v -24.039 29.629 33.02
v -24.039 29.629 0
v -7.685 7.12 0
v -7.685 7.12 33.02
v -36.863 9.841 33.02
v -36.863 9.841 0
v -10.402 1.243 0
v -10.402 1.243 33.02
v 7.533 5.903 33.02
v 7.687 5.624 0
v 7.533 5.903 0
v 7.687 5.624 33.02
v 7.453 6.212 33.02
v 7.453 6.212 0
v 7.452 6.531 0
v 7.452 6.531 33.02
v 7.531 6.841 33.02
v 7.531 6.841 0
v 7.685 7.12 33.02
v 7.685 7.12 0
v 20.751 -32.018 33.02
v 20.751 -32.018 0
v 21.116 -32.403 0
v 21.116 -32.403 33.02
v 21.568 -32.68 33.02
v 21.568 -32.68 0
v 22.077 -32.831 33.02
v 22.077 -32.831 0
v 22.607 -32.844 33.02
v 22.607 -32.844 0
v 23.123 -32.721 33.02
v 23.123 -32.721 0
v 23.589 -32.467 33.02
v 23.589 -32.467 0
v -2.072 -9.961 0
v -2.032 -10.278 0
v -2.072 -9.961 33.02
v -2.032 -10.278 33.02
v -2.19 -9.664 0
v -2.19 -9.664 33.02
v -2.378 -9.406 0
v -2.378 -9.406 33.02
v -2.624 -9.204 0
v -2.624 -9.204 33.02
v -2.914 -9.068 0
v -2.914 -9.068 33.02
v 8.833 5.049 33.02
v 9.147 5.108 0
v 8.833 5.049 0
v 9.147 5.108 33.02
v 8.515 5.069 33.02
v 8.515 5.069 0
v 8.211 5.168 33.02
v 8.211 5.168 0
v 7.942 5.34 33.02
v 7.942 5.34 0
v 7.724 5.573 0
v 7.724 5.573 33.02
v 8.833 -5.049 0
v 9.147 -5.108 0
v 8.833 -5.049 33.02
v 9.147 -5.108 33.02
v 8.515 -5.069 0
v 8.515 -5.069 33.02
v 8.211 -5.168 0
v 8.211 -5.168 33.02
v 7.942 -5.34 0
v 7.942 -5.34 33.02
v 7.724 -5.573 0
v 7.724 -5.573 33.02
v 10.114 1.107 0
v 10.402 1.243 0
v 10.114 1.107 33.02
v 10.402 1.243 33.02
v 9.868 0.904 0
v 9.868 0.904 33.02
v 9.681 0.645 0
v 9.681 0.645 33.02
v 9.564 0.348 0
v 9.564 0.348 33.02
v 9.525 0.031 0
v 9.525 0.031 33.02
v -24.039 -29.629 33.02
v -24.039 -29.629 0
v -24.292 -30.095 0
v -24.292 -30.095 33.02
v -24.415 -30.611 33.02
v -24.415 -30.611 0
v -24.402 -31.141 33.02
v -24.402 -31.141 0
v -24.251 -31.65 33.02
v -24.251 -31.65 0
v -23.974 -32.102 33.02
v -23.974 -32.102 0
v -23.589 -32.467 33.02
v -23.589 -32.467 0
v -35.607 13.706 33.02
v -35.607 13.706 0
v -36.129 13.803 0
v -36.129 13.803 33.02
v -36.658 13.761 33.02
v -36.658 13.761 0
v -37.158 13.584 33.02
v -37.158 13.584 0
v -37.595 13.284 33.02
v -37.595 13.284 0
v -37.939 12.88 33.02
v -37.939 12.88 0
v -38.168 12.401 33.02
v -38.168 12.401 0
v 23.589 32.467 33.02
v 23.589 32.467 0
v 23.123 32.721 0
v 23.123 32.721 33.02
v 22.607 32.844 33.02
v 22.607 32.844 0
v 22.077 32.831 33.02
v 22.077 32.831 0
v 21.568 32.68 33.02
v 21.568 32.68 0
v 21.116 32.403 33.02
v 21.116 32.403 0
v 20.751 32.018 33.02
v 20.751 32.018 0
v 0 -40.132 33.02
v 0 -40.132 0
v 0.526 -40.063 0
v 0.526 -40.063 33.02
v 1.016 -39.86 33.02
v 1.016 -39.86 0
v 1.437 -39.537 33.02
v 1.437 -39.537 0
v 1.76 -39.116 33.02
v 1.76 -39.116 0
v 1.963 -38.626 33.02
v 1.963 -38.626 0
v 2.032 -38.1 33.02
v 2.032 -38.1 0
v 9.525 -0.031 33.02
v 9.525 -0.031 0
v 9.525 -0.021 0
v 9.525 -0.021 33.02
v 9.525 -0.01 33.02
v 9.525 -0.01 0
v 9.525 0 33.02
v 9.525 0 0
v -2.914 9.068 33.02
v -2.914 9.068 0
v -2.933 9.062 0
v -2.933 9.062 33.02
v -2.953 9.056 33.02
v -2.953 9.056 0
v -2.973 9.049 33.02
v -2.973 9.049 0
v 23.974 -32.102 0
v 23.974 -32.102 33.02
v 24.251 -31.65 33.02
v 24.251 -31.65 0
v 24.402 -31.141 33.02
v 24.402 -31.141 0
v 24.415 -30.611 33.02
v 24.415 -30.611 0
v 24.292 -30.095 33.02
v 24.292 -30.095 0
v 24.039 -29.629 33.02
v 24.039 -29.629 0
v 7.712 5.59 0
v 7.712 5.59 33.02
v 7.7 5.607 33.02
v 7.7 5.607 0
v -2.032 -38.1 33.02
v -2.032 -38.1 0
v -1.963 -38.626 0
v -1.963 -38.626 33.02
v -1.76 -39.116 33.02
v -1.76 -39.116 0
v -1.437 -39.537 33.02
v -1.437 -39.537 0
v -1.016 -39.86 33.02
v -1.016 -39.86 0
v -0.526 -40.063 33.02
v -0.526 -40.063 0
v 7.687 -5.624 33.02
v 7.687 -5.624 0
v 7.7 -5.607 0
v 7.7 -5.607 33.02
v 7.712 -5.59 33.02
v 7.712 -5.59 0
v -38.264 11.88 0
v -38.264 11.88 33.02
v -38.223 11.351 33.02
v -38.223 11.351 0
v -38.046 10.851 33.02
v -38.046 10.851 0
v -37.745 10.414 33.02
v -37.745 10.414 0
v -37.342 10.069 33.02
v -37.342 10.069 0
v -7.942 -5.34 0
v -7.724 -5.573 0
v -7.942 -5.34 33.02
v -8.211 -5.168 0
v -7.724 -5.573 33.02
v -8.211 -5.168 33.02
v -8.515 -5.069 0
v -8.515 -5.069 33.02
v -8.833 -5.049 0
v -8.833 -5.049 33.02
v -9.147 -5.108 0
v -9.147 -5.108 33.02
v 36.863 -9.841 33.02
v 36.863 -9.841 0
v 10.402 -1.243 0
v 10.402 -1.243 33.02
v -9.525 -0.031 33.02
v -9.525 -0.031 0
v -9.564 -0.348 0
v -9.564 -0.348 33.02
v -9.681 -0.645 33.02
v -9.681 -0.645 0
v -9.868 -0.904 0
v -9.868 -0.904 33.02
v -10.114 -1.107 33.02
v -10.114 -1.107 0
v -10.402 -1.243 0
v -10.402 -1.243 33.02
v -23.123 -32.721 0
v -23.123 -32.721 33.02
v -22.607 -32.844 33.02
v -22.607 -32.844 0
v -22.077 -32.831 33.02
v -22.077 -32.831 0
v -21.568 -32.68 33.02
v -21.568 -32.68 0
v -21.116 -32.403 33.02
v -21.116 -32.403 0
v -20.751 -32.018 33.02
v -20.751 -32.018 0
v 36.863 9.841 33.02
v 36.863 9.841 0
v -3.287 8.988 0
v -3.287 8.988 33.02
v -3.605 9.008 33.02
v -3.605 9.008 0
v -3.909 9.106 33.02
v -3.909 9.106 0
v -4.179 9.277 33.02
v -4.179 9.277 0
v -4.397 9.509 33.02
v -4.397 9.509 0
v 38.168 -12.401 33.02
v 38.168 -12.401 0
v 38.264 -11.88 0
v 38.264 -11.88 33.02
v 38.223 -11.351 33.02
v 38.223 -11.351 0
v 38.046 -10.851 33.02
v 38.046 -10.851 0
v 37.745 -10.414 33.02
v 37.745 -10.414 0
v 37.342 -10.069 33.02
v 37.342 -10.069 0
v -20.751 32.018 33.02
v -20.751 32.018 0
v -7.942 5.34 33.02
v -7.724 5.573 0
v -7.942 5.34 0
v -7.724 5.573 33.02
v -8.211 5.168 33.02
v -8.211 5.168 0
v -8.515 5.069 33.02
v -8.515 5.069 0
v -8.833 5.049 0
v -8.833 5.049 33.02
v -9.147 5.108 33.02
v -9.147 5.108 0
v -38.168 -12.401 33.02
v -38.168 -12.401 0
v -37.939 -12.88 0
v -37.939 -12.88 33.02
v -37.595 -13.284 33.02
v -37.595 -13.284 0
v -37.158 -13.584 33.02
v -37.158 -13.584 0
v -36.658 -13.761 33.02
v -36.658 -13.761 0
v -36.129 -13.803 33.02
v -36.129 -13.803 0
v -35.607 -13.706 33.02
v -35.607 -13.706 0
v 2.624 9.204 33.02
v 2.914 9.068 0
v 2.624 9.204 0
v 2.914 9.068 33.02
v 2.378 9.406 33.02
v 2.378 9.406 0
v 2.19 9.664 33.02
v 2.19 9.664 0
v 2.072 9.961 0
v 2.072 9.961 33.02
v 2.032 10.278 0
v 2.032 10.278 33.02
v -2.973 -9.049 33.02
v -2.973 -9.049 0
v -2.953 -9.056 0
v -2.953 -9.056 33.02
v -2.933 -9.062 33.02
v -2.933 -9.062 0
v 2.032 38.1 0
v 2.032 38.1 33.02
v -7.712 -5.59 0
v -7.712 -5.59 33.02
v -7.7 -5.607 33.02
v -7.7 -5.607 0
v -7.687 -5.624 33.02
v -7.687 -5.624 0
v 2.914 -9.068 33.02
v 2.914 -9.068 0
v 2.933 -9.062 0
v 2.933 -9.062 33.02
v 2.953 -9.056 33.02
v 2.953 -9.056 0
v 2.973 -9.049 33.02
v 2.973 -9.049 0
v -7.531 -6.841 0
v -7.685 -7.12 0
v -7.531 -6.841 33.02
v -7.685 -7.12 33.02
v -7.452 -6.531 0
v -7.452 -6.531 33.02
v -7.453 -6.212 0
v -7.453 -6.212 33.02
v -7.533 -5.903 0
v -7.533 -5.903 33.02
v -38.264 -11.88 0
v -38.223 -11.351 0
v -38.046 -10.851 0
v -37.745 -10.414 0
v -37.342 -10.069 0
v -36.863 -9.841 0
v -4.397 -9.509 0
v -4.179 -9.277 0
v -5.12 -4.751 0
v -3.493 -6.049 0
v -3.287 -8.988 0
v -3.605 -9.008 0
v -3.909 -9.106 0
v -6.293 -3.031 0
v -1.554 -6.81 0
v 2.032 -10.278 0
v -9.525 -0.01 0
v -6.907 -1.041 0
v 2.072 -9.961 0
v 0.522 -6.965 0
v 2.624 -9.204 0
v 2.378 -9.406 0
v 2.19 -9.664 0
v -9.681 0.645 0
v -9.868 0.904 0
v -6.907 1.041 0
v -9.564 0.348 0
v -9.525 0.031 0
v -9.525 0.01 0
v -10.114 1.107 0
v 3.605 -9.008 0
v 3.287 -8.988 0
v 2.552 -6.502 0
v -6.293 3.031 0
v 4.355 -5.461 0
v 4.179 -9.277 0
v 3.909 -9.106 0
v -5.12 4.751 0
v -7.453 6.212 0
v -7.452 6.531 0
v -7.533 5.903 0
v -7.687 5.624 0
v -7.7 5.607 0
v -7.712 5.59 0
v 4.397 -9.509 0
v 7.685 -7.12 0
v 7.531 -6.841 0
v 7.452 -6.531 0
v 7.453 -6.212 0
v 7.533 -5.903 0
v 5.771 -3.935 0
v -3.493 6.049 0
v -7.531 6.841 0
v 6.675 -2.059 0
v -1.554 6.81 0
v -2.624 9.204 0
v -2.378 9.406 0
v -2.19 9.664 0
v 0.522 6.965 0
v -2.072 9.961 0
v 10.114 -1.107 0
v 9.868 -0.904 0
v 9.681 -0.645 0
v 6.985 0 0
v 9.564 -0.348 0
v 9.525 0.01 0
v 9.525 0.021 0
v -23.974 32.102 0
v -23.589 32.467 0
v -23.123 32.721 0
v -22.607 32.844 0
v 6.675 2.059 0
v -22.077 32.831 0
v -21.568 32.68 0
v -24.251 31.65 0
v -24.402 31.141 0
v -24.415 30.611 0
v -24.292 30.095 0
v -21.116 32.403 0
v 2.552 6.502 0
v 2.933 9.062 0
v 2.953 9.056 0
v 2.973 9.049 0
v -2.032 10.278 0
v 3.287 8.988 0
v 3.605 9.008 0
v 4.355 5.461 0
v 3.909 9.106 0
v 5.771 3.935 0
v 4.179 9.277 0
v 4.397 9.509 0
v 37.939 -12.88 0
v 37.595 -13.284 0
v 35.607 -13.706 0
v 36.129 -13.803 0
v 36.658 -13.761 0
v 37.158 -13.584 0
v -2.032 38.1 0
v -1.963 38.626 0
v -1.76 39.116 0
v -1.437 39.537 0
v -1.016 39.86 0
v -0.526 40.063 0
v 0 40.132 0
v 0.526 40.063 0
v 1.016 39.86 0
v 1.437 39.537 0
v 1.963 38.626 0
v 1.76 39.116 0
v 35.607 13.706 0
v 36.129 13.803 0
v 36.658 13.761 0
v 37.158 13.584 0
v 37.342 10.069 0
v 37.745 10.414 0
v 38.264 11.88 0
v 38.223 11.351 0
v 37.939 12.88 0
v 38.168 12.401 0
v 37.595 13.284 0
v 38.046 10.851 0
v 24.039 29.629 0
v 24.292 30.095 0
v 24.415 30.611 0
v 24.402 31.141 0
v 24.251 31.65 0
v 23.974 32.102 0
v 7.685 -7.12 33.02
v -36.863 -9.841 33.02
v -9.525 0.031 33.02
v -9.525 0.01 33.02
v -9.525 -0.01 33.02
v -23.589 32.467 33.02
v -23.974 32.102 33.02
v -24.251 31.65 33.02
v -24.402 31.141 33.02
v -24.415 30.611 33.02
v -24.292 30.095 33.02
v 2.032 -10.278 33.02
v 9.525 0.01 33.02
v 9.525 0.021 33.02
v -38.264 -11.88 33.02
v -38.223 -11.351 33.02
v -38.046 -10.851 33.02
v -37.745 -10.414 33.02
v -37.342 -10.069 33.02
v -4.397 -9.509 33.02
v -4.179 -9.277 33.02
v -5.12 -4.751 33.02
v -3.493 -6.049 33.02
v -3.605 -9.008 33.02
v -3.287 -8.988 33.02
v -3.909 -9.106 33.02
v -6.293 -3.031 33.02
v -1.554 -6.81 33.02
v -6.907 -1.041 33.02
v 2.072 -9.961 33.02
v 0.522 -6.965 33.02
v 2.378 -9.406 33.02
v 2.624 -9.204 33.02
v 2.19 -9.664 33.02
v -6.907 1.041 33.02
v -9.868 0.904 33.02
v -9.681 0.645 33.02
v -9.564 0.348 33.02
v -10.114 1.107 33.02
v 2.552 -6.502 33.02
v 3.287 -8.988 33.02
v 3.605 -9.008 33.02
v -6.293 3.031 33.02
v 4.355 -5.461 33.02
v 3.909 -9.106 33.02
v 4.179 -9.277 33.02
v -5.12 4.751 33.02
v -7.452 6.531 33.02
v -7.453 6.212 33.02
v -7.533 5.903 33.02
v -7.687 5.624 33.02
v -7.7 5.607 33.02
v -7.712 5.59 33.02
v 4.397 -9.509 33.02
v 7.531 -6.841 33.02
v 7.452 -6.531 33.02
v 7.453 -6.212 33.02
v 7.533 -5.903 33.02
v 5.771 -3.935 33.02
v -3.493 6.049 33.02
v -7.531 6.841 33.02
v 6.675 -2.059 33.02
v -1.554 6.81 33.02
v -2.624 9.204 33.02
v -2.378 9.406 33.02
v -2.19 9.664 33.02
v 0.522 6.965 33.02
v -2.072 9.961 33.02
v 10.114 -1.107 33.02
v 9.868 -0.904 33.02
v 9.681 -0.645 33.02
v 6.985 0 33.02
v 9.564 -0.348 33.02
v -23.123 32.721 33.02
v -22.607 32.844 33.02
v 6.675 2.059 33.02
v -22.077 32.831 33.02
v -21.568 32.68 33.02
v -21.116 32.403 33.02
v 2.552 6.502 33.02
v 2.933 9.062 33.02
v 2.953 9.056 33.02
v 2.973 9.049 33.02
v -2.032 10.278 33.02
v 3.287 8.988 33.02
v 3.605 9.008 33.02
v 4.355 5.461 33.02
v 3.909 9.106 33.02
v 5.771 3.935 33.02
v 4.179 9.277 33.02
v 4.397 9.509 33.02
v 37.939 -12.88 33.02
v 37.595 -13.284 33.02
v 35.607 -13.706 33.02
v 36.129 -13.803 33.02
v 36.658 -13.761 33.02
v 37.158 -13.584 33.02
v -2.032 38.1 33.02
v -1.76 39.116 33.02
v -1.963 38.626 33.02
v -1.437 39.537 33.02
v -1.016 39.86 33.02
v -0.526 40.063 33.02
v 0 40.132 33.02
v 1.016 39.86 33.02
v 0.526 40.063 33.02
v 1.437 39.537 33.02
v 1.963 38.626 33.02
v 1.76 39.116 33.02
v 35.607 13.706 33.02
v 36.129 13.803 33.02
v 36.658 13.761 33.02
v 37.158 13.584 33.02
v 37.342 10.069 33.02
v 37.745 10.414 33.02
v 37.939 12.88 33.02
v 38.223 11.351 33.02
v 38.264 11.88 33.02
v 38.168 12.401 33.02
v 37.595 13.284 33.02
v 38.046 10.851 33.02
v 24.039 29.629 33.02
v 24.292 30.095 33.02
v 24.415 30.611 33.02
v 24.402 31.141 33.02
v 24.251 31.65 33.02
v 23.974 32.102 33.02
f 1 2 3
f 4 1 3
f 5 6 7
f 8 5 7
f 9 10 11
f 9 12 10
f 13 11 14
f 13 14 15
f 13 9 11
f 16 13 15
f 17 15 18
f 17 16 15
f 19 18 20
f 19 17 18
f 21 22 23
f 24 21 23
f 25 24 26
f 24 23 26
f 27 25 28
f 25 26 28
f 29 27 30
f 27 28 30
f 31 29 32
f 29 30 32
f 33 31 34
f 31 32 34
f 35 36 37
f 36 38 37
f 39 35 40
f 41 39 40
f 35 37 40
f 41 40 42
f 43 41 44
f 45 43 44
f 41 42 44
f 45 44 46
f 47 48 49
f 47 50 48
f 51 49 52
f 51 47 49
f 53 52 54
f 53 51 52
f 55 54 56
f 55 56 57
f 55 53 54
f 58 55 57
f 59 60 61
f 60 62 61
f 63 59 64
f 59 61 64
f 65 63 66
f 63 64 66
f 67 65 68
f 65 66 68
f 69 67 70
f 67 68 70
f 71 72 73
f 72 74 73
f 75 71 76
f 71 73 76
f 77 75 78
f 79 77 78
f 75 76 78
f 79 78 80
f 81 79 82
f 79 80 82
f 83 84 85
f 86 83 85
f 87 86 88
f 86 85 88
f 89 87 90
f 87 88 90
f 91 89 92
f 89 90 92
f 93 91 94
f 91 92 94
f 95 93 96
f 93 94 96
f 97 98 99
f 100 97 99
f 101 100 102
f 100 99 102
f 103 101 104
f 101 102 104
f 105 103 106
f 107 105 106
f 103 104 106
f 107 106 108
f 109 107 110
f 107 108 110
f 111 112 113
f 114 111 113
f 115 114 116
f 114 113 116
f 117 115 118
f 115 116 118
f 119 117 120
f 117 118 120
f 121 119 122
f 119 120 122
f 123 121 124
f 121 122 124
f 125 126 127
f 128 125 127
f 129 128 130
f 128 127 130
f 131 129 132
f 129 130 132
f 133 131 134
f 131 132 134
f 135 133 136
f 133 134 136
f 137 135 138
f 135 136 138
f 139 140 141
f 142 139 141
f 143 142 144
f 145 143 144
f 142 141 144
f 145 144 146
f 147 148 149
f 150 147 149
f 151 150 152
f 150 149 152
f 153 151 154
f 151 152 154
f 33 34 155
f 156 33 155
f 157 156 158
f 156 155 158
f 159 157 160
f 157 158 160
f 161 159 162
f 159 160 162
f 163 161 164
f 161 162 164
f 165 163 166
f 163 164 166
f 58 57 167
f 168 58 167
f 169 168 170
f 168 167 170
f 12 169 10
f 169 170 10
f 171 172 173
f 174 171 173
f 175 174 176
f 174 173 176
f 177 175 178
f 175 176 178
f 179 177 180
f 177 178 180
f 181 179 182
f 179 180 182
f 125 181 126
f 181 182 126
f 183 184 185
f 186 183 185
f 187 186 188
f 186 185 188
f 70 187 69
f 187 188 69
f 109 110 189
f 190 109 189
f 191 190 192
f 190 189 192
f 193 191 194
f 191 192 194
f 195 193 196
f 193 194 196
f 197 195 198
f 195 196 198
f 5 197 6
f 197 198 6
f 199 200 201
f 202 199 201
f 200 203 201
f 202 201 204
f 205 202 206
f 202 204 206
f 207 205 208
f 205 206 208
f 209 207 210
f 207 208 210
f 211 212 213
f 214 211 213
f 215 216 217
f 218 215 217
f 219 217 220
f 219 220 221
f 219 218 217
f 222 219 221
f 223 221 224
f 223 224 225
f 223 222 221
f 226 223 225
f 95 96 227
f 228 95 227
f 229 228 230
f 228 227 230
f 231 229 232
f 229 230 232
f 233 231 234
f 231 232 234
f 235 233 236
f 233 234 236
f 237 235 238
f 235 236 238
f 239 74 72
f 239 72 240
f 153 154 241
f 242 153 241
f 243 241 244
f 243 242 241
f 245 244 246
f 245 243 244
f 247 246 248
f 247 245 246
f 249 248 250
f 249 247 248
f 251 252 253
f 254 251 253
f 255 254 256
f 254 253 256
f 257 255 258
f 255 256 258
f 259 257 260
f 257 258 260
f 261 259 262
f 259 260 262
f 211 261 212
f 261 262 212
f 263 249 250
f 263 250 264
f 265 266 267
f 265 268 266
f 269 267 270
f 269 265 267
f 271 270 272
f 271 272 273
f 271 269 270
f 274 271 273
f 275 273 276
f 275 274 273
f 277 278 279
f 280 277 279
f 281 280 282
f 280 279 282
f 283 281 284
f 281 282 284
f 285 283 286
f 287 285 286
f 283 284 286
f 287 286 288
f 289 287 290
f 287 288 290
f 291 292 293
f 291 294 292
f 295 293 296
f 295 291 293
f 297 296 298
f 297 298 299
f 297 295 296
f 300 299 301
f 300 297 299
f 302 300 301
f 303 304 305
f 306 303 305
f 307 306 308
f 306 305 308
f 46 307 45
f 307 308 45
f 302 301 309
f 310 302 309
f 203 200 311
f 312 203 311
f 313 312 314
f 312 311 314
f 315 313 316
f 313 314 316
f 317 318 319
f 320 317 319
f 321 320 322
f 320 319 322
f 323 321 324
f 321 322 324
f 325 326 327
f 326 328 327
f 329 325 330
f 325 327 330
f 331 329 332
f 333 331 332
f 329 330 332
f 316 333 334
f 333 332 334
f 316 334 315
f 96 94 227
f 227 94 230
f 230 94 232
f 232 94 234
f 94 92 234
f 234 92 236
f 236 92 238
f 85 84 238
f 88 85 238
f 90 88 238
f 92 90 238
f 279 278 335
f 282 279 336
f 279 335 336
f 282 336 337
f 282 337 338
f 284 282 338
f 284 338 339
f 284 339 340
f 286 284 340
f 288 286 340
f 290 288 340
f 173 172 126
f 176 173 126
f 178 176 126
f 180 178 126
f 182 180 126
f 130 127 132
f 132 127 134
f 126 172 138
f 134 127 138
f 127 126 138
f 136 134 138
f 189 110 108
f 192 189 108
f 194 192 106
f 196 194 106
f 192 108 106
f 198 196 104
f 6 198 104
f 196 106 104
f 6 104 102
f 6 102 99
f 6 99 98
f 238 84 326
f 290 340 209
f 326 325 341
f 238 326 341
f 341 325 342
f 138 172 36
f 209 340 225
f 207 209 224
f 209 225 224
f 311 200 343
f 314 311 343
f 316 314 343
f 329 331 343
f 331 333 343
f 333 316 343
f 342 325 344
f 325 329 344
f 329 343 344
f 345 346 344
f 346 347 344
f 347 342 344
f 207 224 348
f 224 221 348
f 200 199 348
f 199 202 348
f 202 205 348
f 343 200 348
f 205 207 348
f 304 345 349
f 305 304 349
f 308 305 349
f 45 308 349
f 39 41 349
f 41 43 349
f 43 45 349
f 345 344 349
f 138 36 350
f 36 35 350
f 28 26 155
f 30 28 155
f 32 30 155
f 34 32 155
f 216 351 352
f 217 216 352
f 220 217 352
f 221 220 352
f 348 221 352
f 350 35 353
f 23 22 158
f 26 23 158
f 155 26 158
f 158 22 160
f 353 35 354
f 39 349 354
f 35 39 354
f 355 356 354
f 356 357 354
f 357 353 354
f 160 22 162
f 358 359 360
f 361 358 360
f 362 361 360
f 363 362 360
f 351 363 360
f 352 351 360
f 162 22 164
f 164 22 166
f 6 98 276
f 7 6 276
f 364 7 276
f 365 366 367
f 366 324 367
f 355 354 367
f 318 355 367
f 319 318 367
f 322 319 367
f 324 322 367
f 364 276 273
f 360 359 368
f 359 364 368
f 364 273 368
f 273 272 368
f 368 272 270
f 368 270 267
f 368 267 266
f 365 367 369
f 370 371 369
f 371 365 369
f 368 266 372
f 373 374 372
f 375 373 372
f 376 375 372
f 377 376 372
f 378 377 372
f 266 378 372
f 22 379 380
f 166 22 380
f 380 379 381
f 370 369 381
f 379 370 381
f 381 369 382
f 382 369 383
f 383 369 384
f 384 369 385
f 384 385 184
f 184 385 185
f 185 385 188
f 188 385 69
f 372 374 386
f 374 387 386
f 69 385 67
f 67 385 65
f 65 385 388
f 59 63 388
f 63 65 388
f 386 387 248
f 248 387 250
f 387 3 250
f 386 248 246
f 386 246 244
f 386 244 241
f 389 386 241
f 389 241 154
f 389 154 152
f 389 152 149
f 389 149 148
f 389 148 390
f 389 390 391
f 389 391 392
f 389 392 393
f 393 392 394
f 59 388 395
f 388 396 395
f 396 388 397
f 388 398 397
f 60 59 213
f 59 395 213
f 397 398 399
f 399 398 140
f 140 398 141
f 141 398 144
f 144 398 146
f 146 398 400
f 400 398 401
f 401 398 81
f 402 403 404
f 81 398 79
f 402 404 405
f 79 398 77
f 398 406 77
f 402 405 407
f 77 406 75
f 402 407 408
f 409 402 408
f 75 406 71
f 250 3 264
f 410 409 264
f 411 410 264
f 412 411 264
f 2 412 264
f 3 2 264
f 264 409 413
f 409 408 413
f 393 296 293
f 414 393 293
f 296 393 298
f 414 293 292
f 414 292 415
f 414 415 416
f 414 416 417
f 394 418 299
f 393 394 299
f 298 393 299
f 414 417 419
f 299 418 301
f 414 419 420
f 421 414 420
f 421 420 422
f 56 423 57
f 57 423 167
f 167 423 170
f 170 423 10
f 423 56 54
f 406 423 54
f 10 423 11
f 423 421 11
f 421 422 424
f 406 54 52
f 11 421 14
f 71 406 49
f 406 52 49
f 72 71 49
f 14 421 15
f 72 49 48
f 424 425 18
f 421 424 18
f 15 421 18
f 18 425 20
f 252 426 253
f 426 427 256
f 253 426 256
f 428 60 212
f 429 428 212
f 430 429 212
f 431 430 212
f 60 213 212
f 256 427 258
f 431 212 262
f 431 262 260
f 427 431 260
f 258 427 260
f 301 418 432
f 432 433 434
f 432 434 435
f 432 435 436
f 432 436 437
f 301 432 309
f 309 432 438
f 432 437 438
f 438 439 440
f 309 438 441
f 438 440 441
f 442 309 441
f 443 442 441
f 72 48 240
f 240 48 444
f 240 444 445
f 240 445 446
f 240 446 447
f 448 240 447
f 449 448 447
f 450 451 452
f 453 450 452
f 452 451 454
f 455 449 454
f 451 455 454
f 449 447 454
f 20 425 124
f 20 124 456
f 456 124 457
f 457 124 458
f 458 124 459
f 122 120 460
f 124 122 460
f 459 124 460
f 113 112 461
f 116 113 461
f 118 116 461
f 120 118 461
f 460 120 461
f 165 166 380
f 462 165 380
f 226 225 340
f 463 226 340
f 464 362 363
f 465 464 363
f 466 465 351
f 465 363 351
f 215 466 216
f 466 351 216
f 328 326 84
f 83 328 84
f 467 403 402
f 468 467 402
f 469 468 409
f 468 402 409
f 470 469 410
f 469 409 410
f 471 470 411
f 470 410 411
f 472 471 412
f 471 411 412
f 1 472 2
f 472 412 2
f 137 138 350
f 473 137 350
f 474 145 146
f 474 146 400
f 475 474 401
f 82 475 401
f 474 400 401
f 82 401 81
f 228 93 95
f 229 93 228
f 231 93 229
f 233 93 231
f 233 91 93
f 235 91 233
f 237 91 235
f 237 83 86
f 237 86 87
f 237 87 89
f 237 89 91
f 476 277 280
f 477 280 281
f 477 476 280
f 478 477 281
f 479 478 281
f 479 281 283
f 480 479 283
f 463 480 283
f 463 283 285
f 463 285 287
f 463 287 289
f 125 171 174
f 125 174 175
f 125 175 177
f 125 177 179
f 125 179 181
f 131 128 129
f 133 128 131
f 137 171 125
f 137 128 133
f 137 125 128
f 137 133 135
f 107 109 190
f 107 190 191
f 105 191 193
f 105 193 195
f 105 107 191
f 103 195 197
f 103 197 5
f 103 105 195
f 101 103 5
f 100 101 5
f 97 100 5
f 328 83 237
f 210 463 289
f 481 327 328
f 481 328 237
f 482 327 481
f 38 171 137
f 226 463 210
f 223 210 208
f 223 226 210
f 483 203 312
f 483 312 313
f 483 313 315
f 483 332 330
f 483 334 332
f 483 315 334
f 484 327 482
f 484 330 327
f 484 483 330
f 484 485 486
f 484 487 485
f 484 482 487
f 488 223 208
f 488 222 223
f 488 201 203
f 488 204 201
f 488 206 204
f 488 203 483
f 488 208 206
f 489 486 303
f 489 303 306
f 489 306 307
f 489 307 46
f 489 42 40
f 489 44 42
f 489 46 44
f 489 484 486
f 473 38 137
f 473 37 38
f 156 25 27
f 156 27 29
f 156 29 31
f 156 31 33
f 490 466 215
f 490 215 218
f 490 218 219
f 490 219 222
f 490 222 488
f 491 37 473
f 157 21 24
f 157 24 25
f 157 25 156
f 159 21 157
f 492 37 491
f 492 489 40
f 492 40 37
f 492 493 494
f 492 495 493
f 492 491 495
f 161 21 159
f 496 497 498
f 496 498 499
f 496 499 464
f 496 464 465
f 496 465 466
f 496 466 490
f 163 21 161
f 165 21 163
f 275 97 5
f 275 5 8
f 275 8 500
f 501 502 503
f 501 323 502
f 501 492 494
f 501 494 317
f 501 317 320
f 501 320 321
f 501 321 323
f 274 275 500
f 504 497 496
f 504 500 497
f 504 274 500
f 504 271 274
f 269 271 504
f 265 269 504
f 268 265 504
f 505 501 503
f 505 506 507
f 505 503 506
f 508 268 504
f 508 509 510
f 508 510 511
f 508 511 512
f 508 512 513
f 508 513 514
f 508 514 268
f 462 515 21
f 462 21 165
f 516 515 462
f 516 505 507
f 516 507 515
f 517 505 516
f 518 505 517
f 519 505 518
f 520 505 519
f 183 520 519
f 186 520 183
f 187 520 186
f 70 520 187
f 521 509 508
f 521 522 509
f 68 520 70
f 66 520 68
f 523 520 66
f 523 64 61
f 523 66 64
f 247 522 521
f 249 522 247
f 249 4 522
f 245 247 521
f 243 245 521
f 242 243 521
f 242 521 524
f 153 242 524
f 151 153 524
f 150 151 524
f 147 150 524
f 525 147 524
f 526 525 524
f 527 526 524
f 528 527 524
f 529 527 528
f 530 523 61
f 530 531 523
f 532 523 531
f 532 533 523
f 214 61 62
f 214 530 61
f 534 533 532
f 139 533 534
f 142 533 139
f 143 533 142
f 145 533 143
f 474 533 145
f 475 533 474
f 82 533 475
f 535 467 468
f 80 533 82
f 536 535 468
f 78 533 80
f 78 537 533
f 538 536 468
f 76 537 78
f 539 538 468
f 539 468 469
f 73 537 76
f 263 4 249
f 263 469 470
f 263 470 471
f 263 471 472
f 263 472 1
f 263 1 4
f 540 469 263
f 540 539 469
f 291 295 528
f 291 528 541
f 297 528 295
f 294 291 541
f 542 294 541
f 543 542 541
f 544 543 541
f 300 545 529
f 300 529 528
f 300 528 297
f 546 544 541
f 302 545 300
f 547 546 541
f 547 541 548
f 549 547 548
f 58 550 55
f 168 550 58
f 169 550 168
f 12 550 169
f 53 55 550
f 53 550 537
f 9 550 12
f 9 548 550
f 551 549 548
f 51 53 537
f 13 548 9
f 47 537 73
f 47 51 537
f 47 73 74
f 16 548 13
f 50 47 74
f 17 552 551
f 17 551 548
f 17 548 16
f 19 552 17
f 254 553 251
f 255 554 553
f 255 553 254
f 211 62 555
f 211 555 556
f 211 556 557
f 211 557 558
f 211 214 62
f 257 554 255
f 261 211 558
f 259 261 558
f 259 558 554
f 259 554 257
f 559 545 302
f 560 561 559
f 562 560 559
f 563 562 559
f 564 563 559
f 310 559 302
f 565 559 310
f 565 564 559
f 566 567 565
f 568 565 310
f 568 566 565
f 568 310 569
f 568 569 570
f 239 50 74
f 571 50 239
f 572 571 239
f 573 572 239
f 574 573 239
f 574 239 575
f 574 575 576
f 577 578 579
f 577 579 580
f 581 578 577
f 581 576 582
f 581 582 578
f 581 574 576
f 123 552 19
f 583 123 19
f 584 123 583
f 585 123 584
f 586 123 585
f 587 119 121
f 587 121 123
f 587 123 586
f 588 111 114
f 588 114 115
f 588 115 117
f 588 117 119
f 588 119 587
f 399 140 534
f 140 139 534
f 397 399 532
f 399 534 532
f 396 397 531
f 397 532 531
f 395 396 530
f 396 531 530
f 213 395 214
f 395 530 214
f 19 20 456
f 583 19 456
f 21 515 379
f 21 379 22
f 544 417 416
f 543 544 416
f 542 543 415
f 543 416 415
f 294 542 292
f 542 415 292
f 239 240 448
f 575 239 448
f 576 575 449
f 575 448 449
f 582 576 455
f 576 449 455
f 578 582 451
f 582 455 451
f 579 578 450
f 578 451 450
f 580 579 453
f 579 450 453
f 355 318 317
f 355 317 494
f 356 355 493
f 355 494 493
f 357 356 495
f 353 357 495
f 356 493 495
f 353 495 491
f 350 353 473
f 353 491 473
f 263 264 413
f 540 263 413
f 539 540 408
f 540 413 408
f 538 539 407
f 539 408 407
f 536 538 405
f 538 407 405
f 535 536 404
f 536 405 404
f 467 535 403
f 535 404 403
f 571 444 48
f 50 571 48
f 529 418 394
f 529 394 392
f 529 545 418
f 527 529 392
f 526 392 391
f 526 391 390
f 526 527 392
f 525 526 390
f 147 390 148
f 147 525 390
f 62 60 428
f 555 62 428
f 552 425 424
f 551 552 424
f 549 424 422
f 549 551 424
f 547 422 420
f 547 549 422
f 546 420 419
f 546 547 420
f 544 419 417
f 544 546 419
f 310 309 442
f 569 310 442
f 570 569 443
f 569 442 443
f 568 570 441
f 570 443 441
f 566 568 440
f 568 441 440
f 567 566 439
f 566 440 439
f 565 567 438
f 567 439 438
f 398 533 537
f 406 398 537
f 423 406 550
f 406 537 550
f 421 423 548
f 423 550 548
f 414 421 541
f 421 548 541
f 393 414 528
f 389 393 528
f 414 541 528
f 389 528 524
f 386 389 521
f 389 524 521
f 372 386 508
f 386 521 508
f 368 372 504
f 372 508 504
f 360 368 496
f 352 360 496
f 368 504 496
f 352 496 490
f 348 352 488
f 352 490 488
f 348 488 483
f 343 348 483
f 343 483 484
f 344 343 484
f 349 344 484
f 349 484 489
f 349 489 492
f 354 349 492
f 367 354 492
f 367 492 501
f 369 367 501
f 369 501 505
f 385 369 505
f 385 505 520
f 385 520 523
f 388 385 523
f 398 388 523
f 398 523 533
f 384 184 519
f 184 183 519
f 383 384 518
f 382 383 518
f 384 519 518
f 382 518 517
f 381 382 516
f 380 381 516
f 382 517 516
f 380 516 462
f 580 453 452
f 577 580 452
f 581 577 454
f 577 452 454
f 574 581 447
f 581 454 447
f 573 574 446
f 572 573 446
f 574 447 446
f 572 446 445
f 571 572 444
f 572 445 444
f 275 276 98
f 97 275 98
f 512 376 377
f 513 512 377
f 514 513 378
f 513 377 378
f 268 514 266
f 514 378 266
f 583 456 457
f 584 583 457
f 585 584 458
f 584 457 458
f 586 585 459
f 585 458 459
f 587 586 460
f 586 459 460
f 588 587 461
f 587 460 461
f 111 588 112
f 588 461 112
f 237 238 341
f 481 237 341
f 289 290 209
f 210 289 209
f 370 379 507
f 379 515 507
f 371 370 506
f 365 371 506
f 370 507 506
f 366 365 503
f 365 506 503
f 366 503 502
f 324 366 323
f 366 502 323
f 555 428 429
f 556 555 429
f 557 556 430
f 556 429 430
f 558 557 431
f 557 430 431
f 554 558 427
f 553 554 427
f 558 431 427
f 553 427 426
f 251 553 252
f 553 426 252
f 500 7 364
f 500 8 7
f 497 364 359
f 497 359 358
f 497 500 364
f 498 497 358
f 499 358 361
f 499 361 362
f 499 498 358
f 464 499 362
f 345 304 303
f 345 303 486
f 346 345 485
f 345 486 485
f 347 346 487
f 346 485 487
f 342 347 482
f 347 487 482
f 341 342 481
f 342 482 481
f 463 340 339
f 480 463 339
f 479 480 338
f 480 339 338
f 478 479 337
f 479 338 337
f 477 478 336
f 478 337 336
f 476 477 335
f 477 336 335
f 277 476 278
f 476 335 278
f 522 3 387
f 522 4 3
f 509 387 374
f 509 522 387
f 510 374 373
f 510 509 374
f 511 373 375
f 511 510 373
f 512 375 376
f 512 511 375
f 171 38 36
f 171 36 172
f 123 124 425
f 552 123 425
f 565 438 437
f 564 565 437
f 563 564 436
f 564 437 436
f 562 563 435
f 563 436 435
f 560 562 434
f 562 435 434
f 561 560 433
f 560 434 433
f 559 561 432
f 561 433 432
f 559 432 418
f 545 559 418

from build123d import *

# Parameters (mm, degrees)
F1_DEPTH = 33.02
F2_R     = 6.985
F3_DEPTH = 33.021
F4_R     = 1.27


with BuildPart() as f1:
    # F0 (on Top) → F1 (new body)
    with BuildSketch(Plane.XY):
        with BuildLine():
            Line((-2.032, 6.2538529475), (0, 3.4570448851))
            Line((0, 3.4570448851), (0, 9.525))
            ThreePointArc((0, 9.525), (-1.0218981804, 9.4700237122), (-2.032, 9.3057294717))
            Line((-2.032, 9.3057294717), (-2.032, 6.2538529475))
        make_face()
        with BuildLine():
            Line((0, 9.525), (0, 3.4570448851))
            Line((0, 3.4570448851), (2.032, 6.2538529475))
            Line((2.032, 6.2538529475), (2.032, 9.3057294717))
            ThreePointArc((2.032, 9.3057294717), (1.0218981804, 9.4700237122), (0, 9.525))
        make_face()
        with BuildLine():
            Line((-5.5986545281, 7.7058868714), (-2.032, 2.7968080624))
            Line((-2.032, 2.7968080624), (-2.032, 6.2538529475))
            Line((-2.032, 6.2538529475), (-3.8258480127, 8.7228729203))
            ThreePointArc((-3.8258480127, 8.7228729203), (-4.7396072824, 8.2620668001), (-5.5986545281, 7.7058868714))
        make_face()
        with BuildLine():
            Line((-5.3198450651, 3.8650936822), (-2.032, 2.7968080624))
            Line((-2.032, 2.7968080624), (-5.5986545281, 7.7058868714))
            ThreePointArc((-5.5986545281, 7.7058868714), (-6.3930732713, 7.0607534405), (-7.1136930778, 6.334113655))
            Line((-7.1136930778, 6.334113655), (-5.3198450651, 3.8650936822))
        make_face()
        with BuildLine():
            Line((-9.0588133177, 2.9433868714), (-3.2878450651, 1.0682856198))
            Line((-3.2878450651, 1.0682856198), (-5.3198450651, 3.8650936822))
            Line((-5.3198450651, 3.8650936822), (-8.2223521203, 4.8081753929))
            ThreePointArc((-8.2223521203, 4.8081753929), (-8.6907438566, 3.8982811877), (-9.0588133177, 2.9433868714))
        make_face()
        with BuildLine():
            Line((-6.5756901303, 0), (-3.2878450651, 1.0682856198))
            Line((-3.2878450651, 1.0682856198), (-9.0588133177, 2.9433868714))
            ThreePointArc((-9.0588133177, 2.9433868714), (-9.3223116652, 1.9545153407), (-9.4781971855, 0.9430817107))
            Line((-9.4781971855, 0.9430817107), (-6.5756901303, 0))
        make_face()
        with BuildLine():
            Line((-9.0588133177, -2.9433868714), (-3.2878450651, -1.0682856198))
            Line((-3.2878450651, -1.0682856198), (-6.5756901303, 0))
            Line((-6.5756901303, 0), (-9.4781971855, -0.9430817107))
            ThreePointArc((-9.4781971855, -0.9430817107), (-9.3223116652, -1.9545153407), (-9.0588133177, -2.9433868714))
        make_face()
        with BuildLine():
            Line((-5.3198450651, -3.8650936822), (-3.2878450651, -1.0682856198))
            Line((-3.2878450651, -1.0682856198), (-9.0588133177, -2.9433868714))
            ThreePointArc((-9.0588133177, -2.9433868714), (-8.6907438566, -3.8982811877), (-8.2223521203, -4.8081753929))
            Line((-8.2223521203, -4.8081753929), (-5.3198450651, -3.8650936822))
        make_face()
        with BuildLine():
            Line((-5.5986545281, -7.7058868714), (-2.032, -2.7968080624))
            Line((-2.032, -2.7968080624), (-5.3198450651, -3.8650936822))
            Line((-5.3198450651, -3.8650936822), (-7.1136930778, -6.334113655))
            ThreePointArc((-7.1136930778, -6.334113655), (-6.3930732713, -7.0607534405), (-5.5986545281, -7.7058868714))
        make_face()
        with BuildLine():
            Line((-2.032, -6.2538529475), (-2.032, -2.7968080624))
            Line((-2.032, -2.7968080624), (-5.5986545281, -7.7058868714))
            ThreePointArc((-5.5986545281, -7.7058868714), (-4.7396072824, -8.2620668001), (-3.8258480127, -8.7228729203))
            Line((-3.8258480127, -8.7228729203), (-2.032, -6.2538529475))
        make_face()
        with BuildLine():
            Line((0, -9.525), (0, -3.4570448851))
            Line((0, -3.4570448851), (-2.032, -6.2538529475))
            Line((-2.032, -6.2538529475), (-2.032, -9.3057294717))
            ThreePointArc((-2.032, -9.3057294717), (-1.0218981804, -9.4700237122), (0, -9.525))
        make_face()
        with BuildLine():
            Line((2.032, -6.2538529475), (0, -3.4570448851))
            Line((0, -3.4570448851), (0, -9.525))
            ThreePointArc((0, -9.525), (1.0218981804, -9.4700237122), (2.032, -9.3057294717))
            Line((2.032, -9.3057294717), (2.032, -6.2538529475))
        make_face()
        with BuildLine():
            Line((5.5986545281, -7.7058868714), (2.032, -2.7968080624))
            Line((2.032, -2.7968080624), (2.032, -6.2538529475))
            Line((2.032, -6.2538529475), (3.8258480127, -8.7228729203))
            ThreePointArc((3.8258480127, -8.7228729203), (4.7396072824, -8.2620668001), (5.5986545281, -7.7058868714))
        make_face()
        with BuildLine():
            Line((5.3198450651, -3.8650936822), (2.032, -2.7968080624))
            Line((2.032, -2.7968080624), (5.5986545281, -7.7058868714))
            ThreePointArc((5.5986545281, -7.7058868714), (6.3930732713, -7.0607534405), (7.1136930778, -6.334113655))
            Line((7.1136930778, -6.334113655), (5.3198450651, -3.8650936822))
        make_face()
        with BuildLine():
            Line((9.0588133177, -2.9433868714), (3.2878450651, -1.0682856198))
            Line((3.2878450651, -1.0682856198), (5.3198450651, -3.8650936822))
            Line((5.3198450651, -3.8650936822), (8.2223521203, -4.8081753929))
            ThreePointArc((8.2223521203, -4.8081753929), (8.6907438566, -3.8982811877), (9.0588133177, -2.9433868714))
        make_face()
        with BuildLine():
            Line((6.5756901303, 0), (3.2878450651, -1.0682856198))
            Line((3.2878450651, -1.0682856198), (9.0588133177, -2.9433868714))
            ThreePointArc((9.0588133177, -2.9433868714), (9.3223116652, -1.9545153407), (9.4781971855, -0.9430817107))
            Line((9.4781971855, -0.9430817107), (6.5756901303, 0))
        make_face()
        with BuildLine():
            Line((9.0588133177, 2.9433868714), (3.2878450651, 1.0682856198))
            Line((3.2878450651, 1.0682856198), (6.5756901303, 0))
            Line((6.5756901303, 0), (9.4781971855, 0.9430817107))
            ThreePointArc((9.4781971855, 0.9430817107), (9.3223116652, 1.9545153407), (9.0588133177, 2.9433868714))
        make_face()
        with BuildLine():
            Line((5.3198450651, 3.8650936822), (3.2878450651, 1.0682856198))
            Line((3.2878450651, 1.0682856198), (9.0588133177, 2.9433868714))
            ThreePointArc((9.0588133177, 2.9433868714), (8.6907438566, 3.8982811877), (8.2223521203, 4.8081753929))
            Line((8.2223521203, 4.8081753929), (5.3198450651, 3.8650936822))
        make_face()
        with BuildLine():
            Line((5.5986545281, 7.7058868714), (2.032, 2.7968080624))
            Line((2.032, 2.7968080624), (5.3198450651, 3.8650936822))
            Line((5.3198450651, 3.8650936822), (7.1136930778, 6.334113655))
            ThreePointArc((7.1136930778, 6.334113655), (6.3930732713, 7.0607534405), (5.5986545281, 7.7058868714))
        make_face()
        with BuildLine():
            Line((2.032, 6.2538529475), (2.032, 2.7968080624))
            Line((2.032, 2.7968080624), (5.5986545281, 7.7058868714))
            ThreePointArc((5.5986545281, 7.7058868714), (4.7396072824, 8.2620668001), (3.8258480127, 8.7228729203))
            Line((3.8258480127, 8.7228729203), (2.032, 6.2538529475))
        make_face()
        with BuildLine():
            ThreePointArc((-2.032, 9.3057294717), (-1.0218981804, 9.4700237122), (0, 9.525))
            Line((0, 9.525), (0, 40.132))
            ThreePointArc((0, 40.132), (-1.4368409794, 39.5368409794), (-2.032, 38.1))
            Line((-2.032, 38.1), (-2.032, 9.3057294717))
        make_face()
        with BuildLine():
            Line((0, 40.132), (0, 9.525))
            ThreePointArc((0, 9.525), (1.0218981804, 9.4700237122), (2.032, 9.3057294717))
            Line((2.032, 9.3057294717), (2.032, 38.1))
            ThreePointArc((2.032, 38.1), (1.4368409794, 39.5368409794), (0, 40.132))
        make_face()
        with BuildLine():
            Line((-3.8258480127, 8.7228729203), (-2.032, 6.2538529475))
            Line((-2.032, 6.2538529475), (-2.032, 9.3057294717))
            ThreePointArc((-2.032, 9.3057294717), (-2.9433868714, 9.0588133177), (-3.8258480127, 8.7228729203))
        make_face()
        with BuildLine():
            Line((2.032, 9.3057294717), (2.032, 6.2538529475))
            Line((2.032, 6.2538529475), (3.8258480127, 8.7228729203))
            ThreePointArc((3.8258480127, 8.7228729203), (2.9433868714, 9.0588133177), (2.032, 9.3057294717))
        make_face()
        with BuildLine():
            ThreePointArc((-7.1136930778, 6.334113655), (-6.3930732713, 7.0607534405), (-5.5986545281, 7.7058868714))
            Line((-5.5986545281, 7.7058868714), (-23.588997745, 32.4674700183))
            ThreePointArc((-23.588997745, 32.4674700183), (-24.4016008204, 31.1414223186), (-24.0385406449, 29.629167853))
            Line((-24.0385406449, 29.629167853), (-7.1136930778, 6.334113655))
        make_face()
        with BuildLine():
            Line((-23.588997745, 32.4674700183), (-5.5986545281, 7.7058868714))
            ThreePointArc((-5.5986545281, 7.7058868714), (-4.7396072824, 8.2620668001), (-3.8258480127, 8.7228729203))
            Line((-3.8258480127, 8.7228729203), (-20.7506955798, 32.0179271183))
            ThreePointArc((-20.7506955798, 32.0179271183), (-22.0767432794, 32.8305301938), (-23.588997745, 32.4674700183))
        make_face()
        with BuildLine():
            Line((-8.2223521203, 4.8081753929), (-5.3198450651, 3.8650936822))
            Line((-5.3198450651, 3.8650936822), (-7.1136930778, 6.334113655))
            ThreePointArc((-7.1136930778, 6.334113655), (-7.7058868714, 5.5986545281), (-8.2223521203, 4.8081753929))
        make_face()
        with BuildLine():
            ThreePointArc((-9.4781971855, 0.9430817107), (-9.3223116652, 1.9545153407), (-9.0588133177, 2.9433868714))
            Line((-9.0588133177, 2.9433868714), (-38.167800112, 12.4014700183))
            ThreePointArc((-38.167800112, 12.4014700183), (-38.045778528, 10.8510387902), (-36.8631758034, 9.8410006446))
            Line((-36.8631758034, 9.8410006446), (-9.4781971855, 0.9430817107))
        make_face()
        with BuildLine():
            Line((-38.167800112, 12.4014700183), (-9.0588133177, 2.9433868714))
            ThreePointArc((-9.0588133177, 2.9433868714), (-8.6907438566, 3.8982811877), (-8.2223521203, 4.8081753929))
            Line((-8.2223521203, 4.8081753929), (-35.6073307383, 13.7060943268))
            ThreePointArc((-35.6073307383, 13.7060943268), (-37.1577619663, 13.5840727428), (-38.167800112, 12.4014700183))
        make_face()
        with BuildLine():
            Line((-9.4781971855, -0.9430817107), (-6.5756901303, 0))
            Line((-6.5756901303, 0), (-9.4781971855, 0.9430817107))
            ThreePointArc((-9.4781971855, 0.9430817107), (-9.525, 0), (-9.4781971855, -0.9430817107))
        make_face()
        with BuildLine():
            ThreePointArc((-8.2223521203, -4.8081753929), (-8.6907438566, -3.8982811877), (-9.0588133177, -2.9433868714))
            Line((-9.0588133177, -2.9433868714), (-38.167800112, -12.4014700183))
            ThreePointArc((-38.167800112, -12.4014700183), (-37.1577619663, -13.5840727428), (-35.6073307383, -13.7060943268))
            Line((-35.6073307383, -13.7060943268), (-8.2223521203, -4.8081753929))
        make_face()
        with BuildLine():
            Line((-38.167800112, -12.4014700183), (-9.0588133177, -2.9433868714))
            ThreePointArc((-9.0588133177, -2.9433868714), (-9.3223116652, -1.9545153407), (-9.4781971855, -0.9430817107))
            Line((-9.4781971855, -0.9430817107), (-36.8631758034, -9.8410006446))
            ThreePointArc((-36.8631758034, -9.8410006446), (-38.045778528, -10.8510387902), (-38.167800112, -12.4014700183))
        make_face()
        with BuildLine():
            Line((-7.1136930778, -6.334113655), (-5.3198450651, -3.8650936822))
            Line((-5.3198450651, -3.8650936822), (-8.2223521203, -4.8081753929))
            ThreePointArc((-8.2223521203, -4.8081753929), (-7.7058868714, -5.5986545281), (-7.1136930778, -6.334113655))
        make_face()
        with BuildLine():
            ThreePointArc((-3.8258480127, -8.7228729203), (-4.7396072824, -8.2620668001), (-5.5986545281, -7.7058868714))
            Line((-5.5986545281, -7.7058868714), (-23.588997745, -32.4674700183))
            ThreePointArc((-23.588997745, -32.4674700183), (-22.0767432794, -32.8305301938), (-20.7506955798, -32.0179271183))
            Line((-20.7506955798, -32.0179271183), (-3.8258480127, -8.7228729203))
        make_face()
        with BuildLine():
            Line((-23.588997745, -32.4674700183), (-5.5986545281, -7.7058868714))
            ThreePointArc((-5.5986545281, -7.7058868714), (-6.3930732713, -7.0607534405), (-7.1136930778, -6.334113655))
            Line((-7.1136930778, -6.334113655), (-24.0385406449, -29.629167853))
            ThreePointArc((-24.0385406449, -29.629167853), (-24.4016008204, -31.1414223186), (-23.588997745, -32.4674700183))
        make_face()
        with BuildLine():
            Line((-2.032, -9.3057294717), (-2.032, -6.2538529475))
            Line((-2.032, -6.2538529475), (-3.8258480127, -8.7228729203))
            ThreePointArc((-3.8258480127, -8.7228729203), (-2.9433868714, -9.0588133177), (-2.032, -9.3057294717))
        make_face()
        with BuildLine():
            ThreePointArc((2.032, -9.3057294717), (1.0218981804, -9.4700237122), (0, -9.525))
            Line((0, -9.525), (0, -40.132))
            ThreePointArc((0, -40.132), (1.4368409794, -39.5368409794), (2.032, -38.1))
            Line((2.032, -38.1), (2.032, -9.3057294717))
        make_face()
        with BuildLine():
            Line((0, -40.132), (0, -9.525))
            ThreePointArc((0, -9.525), (-1.0218981804, -9.4700237122), (-2.032, -9.3057294717))
            Line((-2.032, -9.3057294717), (-2.032, -38.1))
            ThreePointArc((-2.032, -38.1), (-1.4368409794, -39.5368409794), (0, -40.132))
        make_face()
        with BuildLine():
            Line((3.8258480127, -8.7228729203), (2.032, -6.2538529475))
            Line((2.032, -6.2538529475), (2.032, -9.3057294717))
            ThreePointArc((2.032, -9.3057294717), (2.9433868714, -9.0588133177), (3.8258480127, -8.7228729203))
        make_face()
        with BuildLine():
            ThreePointArc((7.1136930778, -6.334113655), (6.3930732713, -7.0607534405), (5.5986545281, -7.7058868714))
            Line((5.5986545281, -7.7058868714), (23.588997745, -32.4674700183))
            ThreePointArc((23.588997745, -32.4674700183), (24.4016008204, -31.1414223186), (24.0385406449, -29.629167853))
            Line((24.0385406449, -29.629167853), (7.1136930778, -6.334113655))
        make_face()
        with BuildLine():
            Line((23.588997745, -32.4674700183), (5.5986545281, -7.7058868714))
            ThreePointArc((5.5986545281, -7.7058868714), (4.7396072824, -8.2620668001), (3.8258480127, -8.7228729203))
            Line((3.8258480127, -8.7228729203), (20.7506955798, -32.0179271183))
            ThreePointArc((20.7506955798, -32.0179271183), (22.0767432794, -32.8305301938), (23.588997745, -32.4674700183))
        make_face()
        with BuildLine():
            Line((8.2223521203, -4.8081753929), (5.3198450651, -3.8650936822))
            Line((5.3198450651, -3.8650936822), (7.1136930778, -6.334113655))
            ThreePointArc((7.1136930778, -6.334113655), (7.7058868714, -5.5986545281), (8.2223521203, -4.8081753929))
        make_face()
        with BuildLine():
            ThreePointArc((9.4781971855, -0.9430817107), (9.3223116652, -1.9545153407), (9.0588133177, -2.9433868714))
            Line((9.0588133177, -2.9433868714), (38.167800112, -12.4014700183))
            ThreePointArc((38.167800112, -12.4014700183), (38.045778528, -10.8510387902), (36.8631758034, -9.8410006446))
            Line((36.8631758034, -9.8410006446), (9.4781971855, -0.9430817107))
        make_face()
        with BuildLine():
            Line((38.167800112, -12.4014700183), (9.0588133177, -2.9433868714))
            ThreePointArc((9.0588133177, -2.9433868714), (8.6907438566, -3.8982811877), (8.2223521203, -4.8081753929))
            Line((8.2223521203, -4.8081753929), (35.6073307383, -13.7060943268))
            ThreePointArc((35.6073307383, -13.7060943268), (37.1577619663, -13.5840727428), (38.167800112, -12.4014700183))
        make_face()
        with BuildLine():
            Line((9.4781971855, 0.9430817107), (6.5756901303, 0))
            Line((6.5756901303, 0), (9.4781971855, -0.9430817107))
            ThreePointArc((9.4781971855, -0.9430817107), (9.5132921008, -0.4721211753), (9.525, 0))
            ThreePointArc((9.525, 0), (9.5132921008, 0.4721211753), (9.4781971855, 0.9430817107))
        make_face()
        with BuildLine():
            ThreePointArc((8.2223521203, 4.8081753929), (8.6907438566, 3.8982811877), (9.0588133177, 2.9433868714))
            Line((9.0588133177, 2.9433868714), (38.167800112, 12.4014700183))
            ThreePointArc((38.167800112, 12.4014700183), (37.1577619663, 13.5840727428), (35.6073307383, 13.7060943268))
            Line((35.6073307383, 13.7060943268), (8.2223521203, 4.8081753929))
        make_face()
        with BuildLine():
            Line((38.167800112, 12.4014700183), (9.0588133177, 2.9433868714))
            ThreePointArc((9.0588133177, 2.9433868714), (9.3223116652, 1.9545153407), (9.4781971855, 0.9430817107))
            Line((9.4781971855, 0.9430817107), (36.8631758034, 9.8410006446))
            ThreePointArc((36.8631758034, 9.8410006446), (38.045778528, 10.8510387902), (38.167800112, 12.4014700183))
        make_face()
        with BuildLine():
            Line((7.1136930778, 6.334113655), (5.3198450651, 3.8650936822))
            Line((5.3198450651, 3.8650936822), (8.2223521203, 4.8081753929))
            ThreePointArc((8.2223521203, 4.8081753929), (7.7058868714, 5.5986545281), (7.1136930778, 6.334113655))
        make_face()
        with BuildLine():
            ThreePointArc((3.8258480127, 8.7228729203), (4.7396072824, 8.2620668001), (5.5986545281, 7.7058868714))
            Line((5.5986545281, 7.7058868714), (23.588997745, 32.4674700183))
            ThreePointArc((23.588997745, 32.4674700183), (22.0767432794, 32.8305301938), (20.7506955798, 32.0179271183))
            Line((20.7506955798, 32.0179271183), (3.8258480127, 8.7228729203))
        make_face()
        with BuildLine():
            Line((23.588997745, 32.4674700183), (5.5986545281, 7.7058868714))
            ThreePointArc((5.5986545281, 7.7058868714), (6.3930732713, 7.0607534405), (7.1136930778, 6.334113655))
            Line((7.1136930778, 6.334113655), (24.0385406449, 29.629167853))
            ThreePointArc((24.0385406449, 29.629167853), (24.4016008204, 31.1414223186), (23.588997745, 32.4674700183))
        make_face()
    extrude(amount=F1_DEPTH)

    # F2 (on face) → F3 (cut, through all)
    with BuildSketch(Plane.XY.offset(33.02)):
        Circle(F2_R)
    extrude(amount=-F3_DEPTH, mode=Mode.SUBTRACT)

    # F4
    f4_edges = [f1.edges().sort_by_distance(p)[0] for p in [
        (8.222352, -4.808175, 16.51),
        (7.113693, -6.334114, 16.51),
        (3.825848, -8.722873, 16.51),
        (2.032, -9.305729, 16.51),
        (-2.032, -9.305729, 16.51),
        (-3.825848, -8.722873, 16.51),
        (-7.113693, -6.334114, 16.51),
        (-8.222352, -4.808175, 16.51),
        (-9.478197, -0.943082, 16.51),
        (-9.478197, 0.943082, 16.51),
        (-8.222352, 4.808175, 16.51),
        (-7.113693, 6.334114, 16.51),
        (-3.825848, 8.722873, 16.51),
        (-2.032, 9.305729, 16.51),
        (2.032, 9.305729, 16.51),
        (3.825848, 8.722873, 16.51),
        (8.222352, 4.808175, 16.51),
        (7.113693, 6.334114, 16.51),
        (9.478197, -0.943082, 16.51),
        (9.478197, 0.943082, 16.51),
    ]]
    fillet(f4_edges, radius=F4_R)


solid = f1.part
